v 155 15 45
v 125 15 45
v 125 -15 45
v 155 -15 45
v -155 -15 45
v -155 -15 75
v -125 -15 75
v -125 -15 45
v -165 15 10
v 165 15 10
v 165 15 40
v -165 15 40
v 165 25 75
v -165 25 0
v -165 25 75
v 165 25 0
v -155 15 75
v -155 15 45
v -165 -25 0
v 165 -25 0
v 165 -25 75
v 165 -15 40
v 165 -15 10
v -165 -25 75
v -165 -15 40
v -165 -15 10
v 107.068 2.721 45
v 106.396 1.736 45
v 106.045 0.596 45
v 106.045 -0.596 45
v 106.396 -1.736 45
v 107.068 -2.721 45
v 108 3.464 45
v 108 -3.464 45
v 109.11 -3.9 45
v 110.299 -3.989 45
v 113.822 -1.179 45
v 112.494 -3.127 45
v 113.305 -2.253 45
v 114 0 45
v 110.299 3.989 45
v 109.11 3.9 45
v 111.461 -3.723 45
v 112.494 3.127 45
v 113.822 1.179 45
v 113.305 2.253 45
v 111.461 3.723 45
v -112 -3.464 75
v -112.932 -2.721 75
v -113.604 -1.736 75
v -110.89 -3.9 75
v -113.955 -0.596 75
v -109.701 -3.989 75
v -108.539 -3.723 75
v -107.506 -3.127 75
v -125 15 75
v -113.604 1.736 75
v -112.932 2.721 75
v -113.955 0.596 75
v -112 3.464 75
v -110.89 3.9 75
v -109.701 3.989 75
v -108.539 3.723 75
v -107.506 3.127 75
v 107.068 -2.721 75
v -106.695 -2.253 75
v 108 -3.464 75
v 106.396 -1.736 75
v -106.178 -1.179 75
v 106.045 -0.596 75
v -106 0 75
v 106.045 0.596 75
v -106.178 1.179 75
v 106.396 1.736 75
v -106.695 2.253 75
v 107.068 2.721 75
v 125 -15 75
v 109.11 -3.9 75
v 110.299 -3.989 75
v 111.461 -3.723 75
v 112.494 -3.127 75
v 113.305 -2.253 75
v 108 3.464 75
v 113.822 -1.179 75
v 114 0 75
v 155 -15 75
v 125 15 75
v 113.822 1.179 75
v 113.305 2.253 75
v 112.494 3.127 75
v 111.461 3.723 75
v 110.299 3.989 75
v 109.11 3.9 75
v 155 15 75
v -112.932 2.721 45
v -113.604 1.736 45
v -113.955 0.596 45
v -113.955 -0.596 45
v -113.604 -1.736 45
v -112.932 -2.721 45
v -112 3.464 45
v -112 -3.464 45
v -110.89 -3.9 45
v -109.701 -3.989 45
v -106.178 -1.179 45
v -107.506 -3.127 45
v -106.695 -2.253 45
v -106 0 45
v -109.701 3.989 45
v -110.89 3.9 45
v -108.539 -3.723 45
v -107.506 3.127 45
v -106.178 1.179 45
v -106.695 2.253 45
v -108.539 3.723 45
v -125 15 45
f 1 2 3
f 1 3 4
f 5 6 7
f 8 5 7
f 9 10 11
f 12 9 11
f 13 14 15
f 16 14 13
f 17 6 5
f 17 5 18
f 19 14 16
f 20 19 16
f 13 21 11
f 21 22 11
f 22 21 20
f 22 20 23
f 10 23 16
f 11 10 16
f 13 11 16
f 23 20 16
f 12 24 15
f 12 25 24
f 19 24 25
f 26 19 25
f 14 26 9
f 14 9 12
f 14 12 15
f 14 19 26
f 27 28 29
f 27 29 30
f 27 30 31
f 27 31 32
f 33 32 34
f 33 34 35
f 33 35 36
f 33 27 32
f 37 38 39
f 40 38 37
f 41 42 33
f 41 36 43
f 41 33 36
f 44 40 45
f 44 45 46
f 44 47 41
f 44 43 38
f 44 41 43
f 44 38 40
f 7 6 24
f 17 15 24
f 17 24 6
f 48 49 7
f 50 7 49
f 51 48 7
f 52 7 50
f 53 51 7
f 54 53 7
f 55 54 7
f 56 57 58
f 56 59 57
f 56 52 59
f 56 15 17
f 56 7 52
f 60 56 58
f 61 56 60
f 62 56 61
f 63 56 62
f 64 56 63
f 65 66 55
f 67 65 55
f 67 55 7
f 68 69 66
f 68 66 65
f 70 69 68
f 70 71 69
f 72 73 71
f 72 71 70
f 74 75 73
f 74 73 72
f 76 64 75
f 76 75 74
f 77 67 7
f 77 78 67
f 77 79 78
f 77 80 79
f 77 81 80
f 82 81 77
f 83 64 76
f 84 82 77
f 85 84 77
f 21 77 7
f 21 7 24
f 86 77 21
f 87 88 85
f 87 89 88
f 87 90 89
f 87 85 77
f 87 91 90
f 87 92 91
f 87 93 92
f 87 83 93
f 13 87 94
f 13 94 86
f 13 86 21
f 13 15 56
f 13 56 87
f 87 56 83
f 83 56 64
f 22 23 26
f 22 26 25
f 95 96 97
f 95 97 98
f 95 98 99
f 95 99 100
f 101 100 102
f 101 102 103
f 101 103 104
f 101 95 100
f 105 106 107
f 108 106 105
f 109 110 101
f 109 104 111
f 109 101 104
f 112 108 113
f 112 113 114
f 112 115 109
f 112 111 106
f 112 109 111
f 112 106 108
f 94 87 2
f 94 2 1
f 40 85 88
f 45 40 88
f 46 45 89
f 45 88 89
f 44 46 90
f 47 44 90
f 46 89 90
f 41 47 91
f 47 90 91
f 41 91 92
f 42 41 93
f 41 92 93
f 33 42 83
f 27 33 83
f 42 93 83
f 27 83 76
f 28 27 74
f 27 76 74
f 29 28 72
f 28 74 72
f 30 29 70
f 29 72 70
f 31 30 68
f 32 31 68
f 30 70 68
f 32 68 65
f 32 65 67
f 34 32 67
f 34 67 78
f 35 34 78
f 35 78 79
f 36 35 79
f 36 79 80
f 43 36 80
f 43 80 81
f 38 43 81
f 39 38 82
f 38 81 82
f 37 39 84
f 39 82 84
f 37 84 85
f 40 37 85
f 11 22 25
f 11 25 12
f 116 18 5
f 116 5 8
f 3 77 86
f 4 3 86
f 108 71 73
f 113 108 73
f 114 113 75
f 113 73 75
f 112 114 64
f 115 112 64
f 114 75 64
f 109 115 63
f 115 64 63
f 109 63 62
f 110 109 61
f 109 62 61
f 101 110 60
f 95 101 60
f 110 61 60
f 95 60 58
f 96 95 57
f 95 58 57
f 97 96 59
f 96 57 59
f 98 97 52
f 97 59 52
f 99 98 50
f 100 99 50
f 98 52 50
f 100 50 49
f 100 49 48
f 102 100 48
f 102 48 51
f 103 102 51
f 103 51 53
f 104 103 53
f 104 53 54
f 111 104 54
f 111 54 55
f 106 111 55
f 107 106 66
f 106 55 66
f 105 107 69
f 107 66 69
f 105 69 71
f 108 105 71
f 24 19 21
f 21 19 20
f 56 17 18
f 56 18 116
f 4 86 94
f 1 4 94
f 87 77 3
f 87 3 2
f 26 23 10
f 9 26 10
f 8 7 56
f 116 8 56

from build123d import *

# Parameters (mm, degrees)
CROQUIS1_W              = 330
CROQUIS1_H              = 50
SALIENTE_EXTRUIR1_DEPTH = 75
CROQUIS2_R              = 4
CROQUIS2_W              = 30
CROQUIS2_H              = 30
CORTAR_EXTRUIR1_DEPTH   = 30
CROQUIS3_W              = 30
CROQUIS3_H              = 30
CORTAR_EXTRUIR2_DEPTH   = 331


with BuildPart() as part:
    # Croquis1 → Saliente-Extruir1 (new body)
    with BuildSketch(Plane.XY):
        Rectangle(CROQUIS1_W, CROQUIS1_H)
    extrude(amount=SALIENTE_EXTRUIR1_DEPTH)

    # Croquis2 → Cortar-Extruir1 (cut)
    with BuildSketch(Plane.XY.offset(75)):
        with Locations((-110, 0)):
            Circle(CROQUIS2_R)
        with Locations((110, 0)):
            Circle(CROQUIS2_R)
        with Locations((-140, 0)):
            Rectangle(CROQUIS2_W, CROQUIS2_H)
        with Locations((140, 0)):
            Rectangle(CROQUIS2_W, CROQUIS2_H)
    extrude(amount=-CORTAR_EXTRUIR1_DEPTH, mode=Mode.SUBTRACT)

    # Croquis3 → Cortar-Extruir2 (cut, through all)
    with BuildSketch(Plane.ZY.offset(165)):
        with Locations((25, 0)):
            Rectangle(CROQUIS3_W, CROQUIS3_H)
    extrude(amount=-CORTAR_EXTRUIR2_DEPTH, mode=Mode.SUBTRACT)


solid = part.part
